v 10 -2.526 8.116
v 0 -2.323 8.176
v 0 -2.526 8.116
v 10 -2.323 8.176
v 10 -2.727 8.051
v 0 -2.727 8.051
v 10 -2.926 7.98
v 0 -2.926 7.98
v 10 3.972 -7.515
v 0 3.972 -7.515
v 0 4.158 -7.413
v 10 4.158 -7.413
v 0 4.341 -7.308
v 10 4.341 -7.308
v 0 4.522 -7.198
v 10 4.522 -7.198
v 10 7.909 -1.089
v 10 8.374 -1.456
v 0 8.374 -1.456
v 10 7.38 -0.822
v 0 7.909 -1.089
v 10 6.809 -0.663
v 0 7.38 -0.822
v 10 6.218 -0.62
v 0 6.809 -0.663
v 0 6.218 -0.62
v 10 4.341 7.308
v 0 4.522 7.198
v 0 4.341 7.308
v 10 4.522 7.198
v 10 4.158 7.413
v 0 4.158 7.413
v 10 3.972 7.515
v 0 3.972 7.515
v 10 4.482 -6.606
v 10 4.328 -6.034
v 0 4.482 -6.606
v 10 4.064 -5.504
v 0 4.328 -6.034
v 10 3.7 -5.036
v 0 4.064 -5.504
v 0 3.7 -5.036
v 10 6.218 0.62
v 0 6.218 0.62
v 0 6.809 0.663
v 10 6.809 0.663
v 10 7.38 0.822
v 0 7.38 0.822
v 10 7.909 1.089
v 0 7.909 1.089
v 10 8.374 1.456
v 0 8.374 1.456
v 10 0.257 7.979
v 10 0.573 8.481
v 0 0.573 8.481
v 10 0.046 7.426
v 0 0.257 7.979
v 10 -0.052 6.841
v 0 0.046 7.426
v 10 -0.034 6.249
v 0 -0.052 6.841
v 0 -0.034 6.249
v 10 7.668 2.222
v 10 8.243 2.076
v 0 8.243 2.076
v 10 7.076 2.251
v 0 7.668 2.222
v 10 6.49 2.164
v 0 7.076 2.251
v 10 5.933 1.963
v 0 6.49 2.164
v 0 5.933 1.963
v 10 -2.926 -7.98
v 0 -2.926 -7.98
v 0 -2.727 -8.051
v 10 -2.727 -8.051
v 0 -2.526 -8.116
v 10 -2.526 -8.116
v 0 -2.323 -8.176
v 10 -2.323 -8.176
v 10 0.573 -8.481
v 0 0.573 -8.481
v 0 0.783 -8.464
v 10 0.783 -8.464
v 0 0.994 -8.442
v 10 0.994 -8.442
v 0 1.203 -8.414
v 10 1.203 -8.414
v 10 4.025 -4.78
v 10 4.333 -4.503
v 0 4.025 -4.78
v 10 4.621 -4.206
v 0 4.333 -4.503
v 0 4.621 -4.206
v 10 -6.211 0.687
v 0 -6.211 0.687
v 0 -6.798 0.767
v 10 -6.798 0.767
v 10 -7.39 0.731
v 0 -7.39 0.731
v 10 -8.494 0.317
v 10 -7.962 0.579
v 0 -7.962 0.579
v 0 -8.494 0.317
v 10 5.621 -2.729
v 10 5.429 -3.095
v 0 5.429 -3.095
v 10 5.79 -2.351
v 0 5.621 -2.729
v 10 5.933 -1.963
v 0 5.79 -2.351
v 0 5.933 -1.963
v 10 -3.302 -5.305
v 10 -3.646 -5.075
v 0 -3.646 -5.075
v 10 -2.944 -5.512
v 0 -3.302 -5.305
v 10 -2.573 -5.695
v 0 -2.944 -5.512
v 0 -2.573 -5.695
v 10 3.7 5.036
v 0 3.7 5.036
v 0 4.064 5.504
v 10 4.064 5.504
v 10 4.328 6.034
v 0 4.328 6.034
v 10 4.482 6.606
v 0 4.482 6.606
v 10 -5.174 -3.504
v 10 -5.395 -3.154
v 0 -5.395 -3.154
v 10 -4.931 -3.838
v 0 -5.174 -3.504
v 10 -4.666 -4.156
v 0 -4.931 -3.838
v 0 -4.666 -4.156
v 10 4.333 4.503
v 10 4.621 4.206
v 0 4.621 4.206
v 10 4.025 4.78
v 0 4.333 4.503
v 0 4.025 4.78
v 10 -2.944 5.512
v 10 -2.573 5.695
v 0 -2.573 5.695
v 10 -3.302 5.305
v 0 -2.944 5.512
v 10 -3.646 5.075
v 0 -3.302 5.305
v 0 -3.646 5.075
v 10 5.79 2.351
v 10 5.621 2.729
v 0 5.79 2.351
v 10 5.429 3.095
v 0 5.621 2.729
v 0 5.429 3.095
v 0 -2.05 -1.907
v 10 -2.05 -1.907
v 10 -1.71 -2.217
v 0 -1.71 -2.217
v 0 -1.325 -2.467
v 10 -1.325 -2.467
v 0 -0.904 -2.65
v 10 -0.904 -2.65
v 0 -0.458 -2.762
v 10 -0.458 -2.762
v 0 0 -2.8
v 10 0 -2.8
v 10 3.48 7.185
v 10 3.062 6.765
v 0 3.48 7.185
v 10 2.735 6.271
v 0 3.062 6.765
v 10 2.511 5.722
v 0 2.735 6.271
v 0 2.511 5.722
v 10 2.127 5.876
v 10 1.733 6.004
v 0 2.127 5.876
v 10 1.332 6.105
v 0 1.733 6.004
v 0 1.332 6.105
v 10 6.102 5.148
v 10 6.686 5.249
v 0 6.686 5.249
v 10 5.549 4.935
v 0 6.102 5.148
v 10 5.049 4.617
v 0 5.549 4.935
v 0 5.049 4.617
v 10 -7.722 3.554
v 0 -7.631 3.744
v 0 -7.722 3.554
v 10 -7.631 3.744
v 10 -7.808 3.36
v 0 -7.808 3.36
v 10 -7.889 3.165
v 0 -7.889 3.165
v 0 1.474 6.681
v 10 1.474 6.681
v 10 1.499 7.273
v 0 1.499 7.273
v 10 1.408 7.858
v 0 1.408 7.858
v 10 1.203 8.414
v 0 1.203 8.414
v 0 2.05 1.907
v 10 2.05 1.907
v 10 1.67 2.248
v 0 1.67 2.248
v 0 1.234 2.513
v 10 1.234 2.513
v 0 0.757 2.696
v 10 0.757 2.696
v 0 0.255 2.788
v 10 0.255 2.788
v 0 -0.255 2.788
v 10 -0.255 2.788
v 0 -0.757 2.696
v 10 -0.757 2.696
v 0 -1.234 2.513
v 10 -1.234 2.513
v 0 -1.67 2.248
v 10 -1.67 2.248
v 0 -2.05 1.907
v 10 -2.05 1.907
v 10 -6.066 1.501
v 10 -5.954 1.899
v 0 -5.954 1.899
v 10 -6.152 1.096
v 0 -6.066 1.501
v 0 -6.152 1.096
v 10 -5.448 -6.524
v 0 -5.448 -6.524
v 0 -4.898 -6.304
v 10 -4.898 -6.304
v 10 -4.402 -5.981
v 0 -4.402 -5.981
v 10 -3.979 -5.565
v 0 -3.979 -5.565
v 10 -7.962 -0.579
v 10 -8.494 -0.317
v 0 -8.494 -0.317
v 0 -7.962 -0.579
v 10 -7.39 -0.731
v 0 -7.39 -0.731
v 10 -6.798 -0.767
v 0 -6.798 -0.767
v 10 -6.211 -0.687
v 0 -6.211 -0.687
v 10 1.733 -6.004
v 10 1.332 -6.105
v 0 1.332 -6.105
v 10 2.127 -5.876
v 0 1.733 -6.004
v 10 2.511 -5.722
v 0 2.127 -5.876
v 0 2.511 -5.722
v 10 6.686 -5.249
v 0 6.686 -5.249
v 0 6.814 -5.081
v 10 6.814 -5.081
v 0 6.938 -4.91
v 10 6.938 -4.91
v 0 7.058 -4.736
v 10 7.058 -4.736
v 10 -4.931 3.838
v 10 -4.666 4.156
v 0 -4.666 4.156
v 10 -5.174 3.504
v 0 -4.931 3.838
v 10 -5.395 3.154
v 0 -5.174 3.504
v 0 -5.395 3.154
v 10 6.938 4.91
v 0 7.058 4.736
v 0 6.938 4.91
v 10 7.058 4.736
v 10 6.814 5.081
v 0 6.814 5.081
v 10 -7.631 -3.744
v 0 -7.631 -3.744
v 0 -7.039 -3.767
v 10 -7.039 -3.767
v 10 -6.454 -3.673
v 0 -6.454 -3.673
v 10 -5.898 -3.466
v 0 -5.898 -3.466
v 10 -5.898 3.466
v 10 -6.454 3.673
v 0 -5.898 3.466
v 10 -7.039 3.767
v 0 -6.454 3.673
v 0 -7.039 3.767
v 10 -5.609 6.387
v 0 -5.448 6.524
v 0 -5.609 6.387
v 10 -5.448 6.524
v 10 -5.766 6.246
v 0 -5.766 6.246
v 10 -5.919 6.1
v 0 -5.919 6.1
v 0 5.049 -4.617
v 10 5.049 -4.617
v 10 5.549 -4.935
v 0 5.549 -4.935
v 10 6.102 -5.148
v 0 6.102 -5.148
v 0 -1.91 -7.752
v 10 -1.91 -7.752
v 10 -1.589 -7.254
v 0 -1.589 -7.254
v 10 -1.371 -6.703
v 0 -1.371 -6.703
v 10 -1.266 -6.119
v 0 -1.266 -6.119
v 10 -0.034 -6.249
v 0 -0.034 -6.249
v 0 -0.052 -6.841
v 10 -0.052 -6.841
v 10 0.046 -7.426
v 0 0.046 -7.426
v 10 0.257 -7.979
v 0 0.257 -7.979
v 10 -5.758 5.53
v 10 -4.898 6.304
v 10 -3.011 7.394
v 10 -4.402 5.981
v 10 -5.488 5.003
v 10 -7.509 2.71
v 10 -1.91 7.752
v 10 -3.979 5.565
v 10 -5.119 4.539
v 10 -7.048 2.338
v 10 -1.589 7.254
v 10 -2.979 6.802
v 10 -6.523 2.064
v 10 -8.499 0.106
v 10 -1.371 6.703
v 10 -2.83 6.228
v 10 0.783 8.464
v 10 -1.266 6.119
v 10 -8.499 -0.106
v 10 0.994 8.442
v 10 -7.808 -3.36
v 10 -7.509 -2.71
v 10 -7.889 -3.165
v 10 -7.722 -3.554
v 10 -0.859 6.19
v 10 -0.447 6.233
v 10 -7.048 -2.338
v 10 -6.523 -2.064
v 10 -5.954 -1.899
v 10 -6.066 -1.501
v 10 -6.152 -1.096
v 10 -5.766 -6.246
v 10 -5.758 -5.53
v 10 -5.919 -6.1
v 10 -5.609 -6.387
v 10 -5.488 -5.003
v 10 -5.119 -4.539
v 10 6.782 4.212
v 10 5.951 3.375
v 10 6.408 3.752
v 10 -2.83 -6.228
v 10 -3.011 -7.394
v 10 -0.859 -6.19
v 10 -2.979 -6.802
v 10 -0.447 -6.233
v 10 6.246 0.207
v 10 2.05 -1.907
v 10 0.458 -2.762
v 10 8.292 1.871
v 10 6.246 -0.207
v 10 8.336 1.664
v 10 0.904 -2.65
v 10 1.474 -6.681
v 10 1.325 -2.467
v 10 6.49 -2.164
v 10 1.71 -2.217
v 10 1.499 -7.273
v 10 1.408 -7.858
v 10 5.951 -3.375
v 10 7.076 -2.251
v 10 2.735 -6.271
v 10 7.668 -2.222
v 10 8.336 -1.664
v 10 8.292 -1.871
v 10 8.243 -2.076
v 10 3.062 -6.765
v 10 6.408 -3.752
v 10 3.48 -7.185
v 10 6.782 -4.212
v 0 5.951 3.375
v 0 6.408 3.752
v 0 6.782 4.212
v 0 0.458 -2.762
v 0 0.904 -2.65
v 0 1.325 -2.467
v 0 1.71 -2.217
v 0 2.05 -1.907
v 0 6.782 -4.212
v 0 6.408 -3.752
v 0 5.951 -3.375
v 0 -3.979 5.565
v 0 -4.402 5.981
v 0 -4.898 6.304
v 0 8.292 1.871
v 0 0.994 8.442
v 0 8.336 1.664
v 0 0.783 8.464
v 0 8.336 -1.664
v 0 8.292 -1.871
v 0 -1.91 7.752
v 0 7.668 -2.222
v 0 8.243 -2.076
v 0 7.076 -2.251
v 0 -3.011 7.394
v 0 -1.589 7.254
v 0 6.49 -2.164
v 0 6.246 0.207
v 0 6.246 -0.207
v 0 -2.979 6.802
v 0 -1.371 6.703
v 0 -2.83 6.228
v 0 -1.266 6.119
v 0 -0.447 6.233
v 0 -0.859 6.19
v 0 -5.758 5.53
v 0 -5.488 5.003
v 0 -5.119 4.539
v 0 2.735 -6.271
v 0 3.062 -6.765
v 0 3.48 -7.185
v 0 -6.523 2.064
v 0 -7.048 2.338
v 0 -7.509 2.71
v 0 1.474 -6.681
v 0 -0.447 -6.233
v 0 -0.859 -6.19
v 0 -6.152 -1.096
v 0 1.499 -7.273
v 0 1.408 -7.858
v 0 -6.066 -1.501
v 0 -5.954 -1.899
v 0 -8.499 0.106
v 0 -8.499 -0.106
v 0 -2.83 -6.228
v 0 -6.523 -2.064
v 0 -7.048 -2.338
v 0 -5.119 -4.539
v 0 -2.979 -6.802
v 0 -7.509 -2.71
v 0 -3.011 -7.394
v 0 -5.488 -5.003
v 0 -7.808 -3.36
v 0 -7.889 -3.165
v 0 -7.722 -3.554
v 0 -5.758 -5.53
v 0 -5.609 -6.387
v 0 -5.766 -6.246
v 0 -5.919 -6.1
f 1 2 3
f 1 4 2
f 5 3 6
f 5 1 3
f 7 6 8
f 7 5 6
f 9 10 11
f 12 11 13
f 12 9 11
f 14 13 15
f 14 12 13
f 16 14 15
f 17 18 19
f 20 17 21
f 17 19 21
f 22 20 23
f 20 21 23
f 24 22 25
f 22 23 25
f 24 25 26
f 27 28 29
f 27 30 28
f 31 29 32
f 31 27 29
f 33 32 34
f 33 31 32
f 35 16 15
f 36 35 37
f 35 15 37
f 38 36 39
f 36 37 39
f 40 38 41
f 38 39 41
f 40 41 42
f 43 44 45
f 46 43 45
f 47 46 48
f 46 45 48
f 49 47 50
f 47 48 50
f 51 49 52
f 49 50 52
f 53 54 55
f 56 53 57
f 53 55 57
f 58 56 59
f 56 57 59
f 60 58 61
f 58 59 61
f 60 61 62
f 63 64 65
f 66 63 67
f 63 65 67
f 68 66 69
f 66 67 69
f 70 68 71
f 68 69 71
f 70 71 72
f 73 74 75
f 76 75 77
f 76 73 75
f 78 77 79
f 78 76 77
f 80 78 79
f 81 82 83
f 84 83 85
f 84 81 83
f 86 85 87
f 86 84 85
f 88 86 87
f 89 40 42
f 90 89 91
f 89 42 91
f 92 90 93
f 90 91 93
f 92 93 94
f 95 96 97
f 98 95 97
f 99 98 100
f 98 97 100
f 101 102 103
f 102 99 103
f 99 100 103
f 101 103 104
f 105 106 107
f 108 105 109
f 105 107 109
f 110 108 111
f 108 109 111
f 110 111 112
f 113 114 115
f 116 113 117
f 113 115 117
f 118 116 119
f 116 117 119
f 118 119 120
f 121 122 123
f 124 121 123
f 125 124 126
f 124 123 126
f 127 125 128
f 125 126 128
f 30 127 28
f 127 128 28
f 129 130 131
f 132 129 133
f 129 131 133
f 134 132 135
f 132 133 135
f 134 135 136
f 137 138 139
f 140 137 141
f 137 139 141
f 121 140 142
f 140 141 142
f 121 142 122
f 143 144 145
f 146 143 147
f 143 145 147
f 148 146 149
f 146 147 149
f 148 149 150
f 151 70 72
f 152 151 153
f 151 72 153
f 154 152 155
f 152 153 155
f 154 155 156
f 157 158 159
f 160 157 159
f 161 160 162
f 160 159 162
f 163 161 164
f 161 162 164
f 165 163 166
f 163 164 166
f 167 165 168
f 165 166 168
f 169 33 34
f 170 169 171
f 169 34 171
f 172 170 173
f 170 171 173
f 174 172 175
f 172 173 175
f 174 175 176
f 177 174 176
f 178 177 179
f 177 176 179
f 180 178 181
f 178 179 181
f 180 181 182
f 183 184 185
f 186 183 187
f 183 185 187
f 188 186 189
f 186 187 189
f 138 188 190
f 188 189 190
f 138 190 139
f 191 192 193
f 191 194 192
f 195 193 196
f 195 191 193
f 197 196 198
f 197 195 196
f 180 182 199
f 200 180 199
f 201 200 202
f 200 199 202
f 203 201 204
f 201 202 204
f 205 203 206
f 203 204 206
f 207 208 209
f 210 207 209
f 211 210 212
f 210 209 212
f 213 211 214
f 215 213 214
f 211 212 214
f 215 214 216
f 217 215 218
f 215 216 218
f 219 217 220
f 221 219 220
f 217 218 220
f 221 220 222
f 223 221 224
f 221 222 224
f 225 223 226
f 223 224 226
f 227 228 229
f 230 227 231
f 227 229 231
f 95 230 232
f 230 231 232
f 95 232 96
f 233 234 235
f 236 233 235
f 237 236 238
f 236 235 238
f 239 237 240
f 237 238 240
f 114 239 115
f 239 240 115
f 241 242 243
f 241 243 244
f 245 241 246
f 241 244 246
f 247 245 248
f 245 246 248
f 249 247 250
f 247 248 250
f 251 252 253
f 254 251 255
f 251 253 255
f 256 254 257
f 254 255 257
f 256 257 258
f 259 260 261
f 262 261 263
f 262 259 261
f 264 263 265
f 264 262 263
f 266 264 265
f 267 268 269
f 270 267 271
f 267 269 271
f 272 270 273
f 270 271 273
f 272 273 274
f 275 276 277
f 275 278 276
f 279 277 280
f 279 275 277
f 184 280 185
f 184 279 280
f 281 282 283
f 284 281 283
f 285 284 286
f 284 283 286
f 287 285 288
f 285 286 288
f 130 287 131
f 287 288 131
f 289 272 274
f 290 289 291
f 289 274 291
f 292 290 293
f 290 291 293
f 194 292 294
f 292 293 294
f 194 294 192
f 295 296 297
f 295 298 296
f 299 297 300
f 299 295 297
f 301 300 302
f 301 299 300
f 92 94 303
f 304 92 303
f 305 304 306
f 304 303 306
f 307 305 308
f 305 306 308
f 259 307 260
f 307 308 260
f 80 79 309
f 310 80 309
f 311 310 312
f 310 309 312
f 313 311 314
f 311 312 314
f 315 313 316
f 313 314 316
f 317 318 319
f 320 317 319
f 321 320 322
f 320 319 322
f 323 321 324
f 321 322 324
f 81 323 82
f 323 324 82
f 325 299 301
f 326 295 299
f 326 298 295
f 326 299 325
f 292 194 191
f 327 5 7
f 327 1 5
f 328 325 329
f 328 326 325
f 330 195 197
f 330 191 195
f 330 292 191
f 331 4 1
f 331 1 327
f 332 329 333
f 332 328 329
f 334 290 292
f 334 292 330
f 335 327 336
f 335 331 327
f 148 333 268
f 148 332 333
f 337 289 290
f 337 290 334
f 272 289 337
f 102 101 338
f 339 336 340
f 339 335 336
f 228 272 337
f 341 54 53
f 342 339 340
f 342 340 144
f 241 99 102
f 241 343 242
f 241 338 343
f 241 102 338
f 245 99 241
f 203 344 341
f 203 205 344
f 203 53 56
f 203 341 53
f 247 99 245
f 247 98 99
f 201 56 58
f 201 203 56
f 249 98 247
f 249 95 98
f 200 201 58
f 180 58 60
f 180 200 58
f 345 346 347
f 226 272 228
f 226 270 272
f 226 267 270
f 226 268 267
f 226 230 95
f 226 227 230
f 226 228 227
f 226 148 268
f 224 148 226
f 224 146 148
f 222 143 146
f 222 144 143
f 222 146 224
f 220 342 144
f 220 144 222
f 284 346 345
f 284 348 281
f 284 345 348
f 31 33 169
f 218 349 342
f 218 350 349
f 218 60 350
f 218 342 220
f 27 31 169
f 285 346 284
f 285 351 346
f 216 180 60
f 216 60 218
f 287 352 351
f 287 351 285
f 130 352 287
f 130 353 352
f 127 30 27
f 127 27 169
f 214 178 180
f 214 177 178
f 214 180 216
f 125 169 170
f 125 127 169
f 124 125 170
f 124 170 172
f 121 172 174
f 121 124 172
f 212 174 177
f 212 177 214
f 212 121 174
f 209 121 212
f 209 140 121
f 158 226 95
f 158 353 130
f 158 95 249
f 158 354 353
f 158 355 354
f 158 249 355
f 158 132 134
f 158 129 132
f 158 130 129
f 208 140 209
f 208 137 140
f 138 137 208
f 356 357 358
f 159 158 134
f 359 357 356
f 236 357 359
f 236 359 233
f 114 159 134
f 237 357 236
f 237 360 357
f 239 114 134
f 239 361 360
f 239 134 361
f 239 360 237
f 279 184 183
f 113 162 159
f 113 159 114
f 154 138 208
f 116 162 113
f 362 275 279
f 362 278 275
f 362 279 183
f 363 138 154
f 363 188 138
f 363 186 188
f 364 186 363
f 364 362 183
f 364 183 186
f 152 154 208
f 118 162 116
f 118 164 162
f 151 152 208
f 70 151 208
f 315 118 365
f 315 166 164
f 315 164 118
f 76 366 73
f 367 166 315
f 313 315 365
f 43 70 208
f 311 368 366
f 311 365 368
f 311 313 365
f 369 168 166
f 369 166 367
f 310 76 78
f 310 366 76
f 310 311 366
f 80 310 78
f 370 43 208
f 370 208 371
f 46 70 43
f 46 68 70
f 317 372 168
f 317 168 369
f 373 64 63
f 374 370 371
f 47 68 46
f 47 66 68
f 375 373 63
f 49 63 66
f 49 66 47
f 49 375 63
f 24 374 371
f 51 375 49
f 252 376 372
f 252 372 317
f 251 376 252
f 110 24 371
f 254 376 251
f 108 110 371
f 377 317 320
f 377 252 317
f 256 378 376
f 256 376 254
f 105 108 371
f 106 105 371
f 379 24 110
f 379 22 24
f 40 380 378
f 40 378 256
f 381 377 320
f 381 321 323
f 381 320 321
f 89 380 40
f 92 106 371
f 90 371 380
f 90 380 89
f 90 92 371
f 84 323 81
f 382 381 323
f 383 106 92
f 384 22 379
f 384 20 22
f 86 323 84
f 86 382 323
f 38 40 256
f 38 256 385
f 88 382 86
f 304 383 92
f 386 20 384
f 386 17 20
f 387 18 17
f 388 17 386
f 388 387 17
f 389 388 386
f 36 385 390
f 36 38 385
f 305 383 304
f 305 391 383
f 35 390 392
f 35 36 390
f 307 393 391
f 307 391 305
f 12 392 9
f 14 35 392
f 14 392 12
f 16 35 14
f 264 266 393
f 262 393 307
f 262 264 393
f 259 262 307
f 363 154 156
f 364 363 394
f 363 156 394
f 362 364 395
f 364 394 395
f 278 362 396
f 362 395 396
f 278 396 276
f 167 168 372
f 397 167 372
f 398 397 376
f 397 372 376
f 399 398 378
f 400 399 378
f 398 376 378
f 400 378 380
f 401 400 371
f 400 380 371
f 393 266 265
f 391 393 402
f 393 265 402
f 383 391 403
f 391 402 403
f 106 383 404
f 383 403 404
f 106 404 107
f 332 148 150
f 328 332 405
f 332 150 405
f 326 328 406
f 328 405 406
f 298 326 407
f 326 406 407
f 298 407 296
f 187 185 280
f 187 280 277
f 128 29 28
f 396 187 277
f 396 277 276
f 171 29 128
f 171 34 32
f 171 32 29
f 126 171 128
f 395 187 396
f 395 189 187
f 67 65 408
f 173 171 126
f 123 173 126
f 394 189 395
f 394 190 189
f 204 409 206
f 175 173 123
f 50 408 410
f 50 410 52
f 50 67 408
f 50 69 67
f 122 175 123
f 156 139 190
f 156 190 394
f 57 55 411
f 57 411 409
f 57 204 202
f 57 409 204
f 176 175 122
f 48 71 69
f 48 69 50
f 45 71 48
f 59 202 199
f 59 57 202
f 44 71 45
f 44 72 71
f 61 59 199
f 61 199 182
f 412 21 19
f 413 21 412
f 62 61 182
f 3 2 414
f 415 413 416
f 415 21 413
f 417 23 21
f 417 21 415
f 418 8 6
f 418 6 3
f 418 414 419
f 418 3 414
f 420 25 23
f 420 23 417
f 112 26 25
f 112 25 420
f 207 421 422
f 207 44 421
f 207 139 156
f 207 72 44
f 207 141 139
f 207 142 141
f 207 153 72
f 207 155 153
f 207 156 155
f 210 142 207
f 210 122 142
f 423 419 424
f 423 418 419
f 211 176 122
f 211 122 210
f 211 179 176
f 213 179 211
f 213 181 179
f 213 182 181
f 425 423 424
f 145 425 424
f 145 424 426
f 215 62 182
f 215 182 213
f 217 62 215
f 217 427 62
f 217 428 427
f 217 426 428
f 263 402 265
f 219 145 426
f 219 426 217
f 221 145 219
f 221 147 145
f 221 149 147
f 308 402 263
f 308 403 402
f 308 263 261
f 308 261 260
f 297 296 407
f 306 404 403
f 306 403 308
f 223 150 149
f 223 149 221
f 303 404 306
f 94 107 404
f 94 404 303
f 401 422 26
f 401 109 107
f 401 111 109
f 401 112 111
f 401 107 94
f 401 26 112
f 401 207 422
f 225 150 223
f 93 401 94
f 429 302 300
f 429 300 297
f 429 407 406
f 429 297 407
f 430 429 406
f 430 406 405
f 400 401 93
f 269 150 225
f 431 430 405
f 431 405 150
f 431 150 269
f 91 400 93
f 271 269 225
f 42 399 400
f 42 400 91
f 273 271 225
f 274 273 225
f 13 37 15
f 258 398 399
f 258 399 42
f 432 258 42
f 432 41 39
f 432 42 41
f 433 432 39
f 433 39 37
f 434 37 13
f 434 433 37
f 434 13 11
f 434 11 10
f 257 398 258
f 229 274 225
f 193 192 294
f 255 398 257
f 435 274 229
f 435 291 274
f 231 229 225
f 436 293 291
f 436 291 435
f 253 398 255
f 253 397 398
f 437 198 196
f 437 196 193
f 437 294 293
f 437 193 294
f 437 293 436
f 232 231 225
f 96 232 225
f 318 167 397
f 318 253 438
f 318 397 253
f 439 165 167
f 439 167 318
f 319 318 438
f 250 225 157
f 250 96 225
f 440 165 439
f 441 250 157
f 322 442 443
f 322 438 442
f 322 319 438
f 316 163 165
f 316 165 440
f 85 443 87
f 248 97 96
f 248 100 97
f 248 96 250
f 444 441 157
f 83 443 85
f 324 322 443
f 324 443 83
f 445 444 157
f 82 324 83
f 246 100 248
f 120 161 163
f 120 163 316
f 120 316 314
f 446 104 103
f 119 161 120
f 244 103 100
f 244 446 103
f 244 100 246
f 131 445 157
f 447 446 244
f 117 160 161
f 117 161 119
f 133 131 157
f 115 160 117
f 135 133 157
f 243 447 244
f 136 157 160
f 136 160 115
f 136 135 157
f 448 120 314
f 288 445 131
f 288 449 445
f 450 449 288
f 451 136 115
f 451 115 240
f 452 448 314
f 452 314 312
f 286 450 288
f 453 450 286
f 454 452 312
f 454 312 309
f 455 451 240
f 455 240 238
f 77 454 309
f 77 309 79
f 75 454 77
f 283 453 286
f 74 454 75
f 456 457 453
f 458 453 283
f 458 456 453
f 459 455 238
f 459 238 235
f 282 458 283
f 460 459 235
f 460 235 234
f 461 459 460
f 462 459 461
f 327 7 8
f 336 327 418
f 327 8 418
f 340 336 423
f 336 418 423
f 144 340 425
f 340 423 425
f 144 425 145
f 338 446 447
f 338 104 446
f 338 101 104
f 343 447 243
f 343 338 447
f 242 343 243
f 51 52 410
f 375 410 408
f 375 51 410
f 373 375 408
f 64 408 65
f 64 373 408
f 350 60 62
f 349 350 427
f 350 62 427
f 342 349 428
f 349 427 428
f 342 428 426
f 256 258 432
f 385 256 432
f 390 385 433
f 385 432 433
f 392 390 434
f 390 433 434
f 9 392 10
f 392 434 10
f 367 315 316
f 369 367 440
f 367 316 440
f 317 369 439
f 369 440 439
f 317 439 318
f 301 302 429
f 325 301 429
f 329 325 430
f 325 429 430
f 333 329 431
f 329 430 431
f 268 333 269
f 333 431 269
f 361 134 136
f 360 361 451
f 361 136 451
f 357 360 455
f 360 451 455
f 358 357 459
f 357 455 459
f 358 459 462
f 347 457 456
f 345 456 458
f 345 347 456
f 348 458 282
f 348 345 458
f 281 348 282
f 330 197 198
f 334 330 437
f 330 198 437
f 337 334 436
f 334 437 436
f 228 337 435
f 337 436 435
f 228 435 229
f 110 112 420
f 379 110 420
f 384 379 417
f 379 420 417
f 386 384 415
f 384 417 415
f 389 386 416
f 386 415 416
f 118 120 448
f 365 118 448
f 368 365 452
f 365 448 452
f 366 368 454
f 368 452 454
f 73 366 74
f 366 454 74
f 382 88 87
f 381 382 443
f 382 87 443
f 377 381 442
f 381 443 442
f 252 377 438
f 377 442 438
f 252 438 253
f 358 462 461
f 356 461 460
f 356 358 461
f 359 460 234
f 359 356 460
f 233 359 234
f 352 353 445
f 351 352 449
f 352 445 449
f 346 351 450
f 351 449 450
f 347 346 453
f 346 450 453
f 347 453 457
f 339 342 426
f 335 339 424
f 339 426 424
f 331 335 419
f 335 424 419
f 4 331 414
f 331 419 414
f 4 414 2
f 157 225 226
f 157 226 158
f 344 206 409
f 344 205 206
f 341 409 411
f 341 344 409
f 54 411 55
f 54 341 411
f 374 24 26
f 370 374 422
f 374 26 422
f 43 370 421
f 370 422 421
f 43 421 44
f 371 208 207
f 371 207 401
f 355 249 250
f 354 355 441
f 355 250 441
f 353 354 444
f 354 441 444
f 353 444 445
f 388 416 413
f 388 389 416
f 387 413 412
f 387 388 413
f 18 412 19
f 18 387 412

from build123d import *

# Parameters (mm, degrees)
BASPROSKE_W         = 10
BASPROSKE_H         = 8.5
TOOTHCUT_DEPTH      = 16.636495771
TEETHCUTS_COUNT     = 15
TEETHCUTS_ANGLE     = 336
BORSKE_R            = 2.5
BORE_DEPTH          = 50.0000508
BOSS_EXTRUDE1_DEPTH = 10
CUT_EXTRUDE1_DEPTH  = 10


with BuildPart() as part:
    # BasProSke → Base-Revolve (revolve)
    with BuildSketch(Plane(origin=(0, 0, 0), x_dir=(1, 0, 0), z_dir=(0, 1, 0)), mode=Mode.PRIVATE) as base_revolve_sk:
        with Locations((5, 4.25)):
            Rectangle(BASPROSKE_W, BASPROSKE_H)
    revolve(base_revolve_sk.sketch.rotate(Axis((-10, 0, 0), (1, 0, 0)), 180), axis=Axis((-10, 0, 0), (1, 0, 0)))

    # TooCutSke → ToothCut (cut, through all)
    with BuildSketch(Plane(origin=(0, 0, 0), x_dir=(0, 0, -1), z_dir=(1, 0, 0))):
        with BuildLine():
            ThreePointArc((0.619547138, 6.21821215), (0, 6.249), (-0.619547138, 6.21821215))
            ThreePointArc((-0.619547138, 6.21821215), (-0.827197364, 7.394441061), (-1.477319646, 8.396426134))
            ThreePointArc((-1.477319646, 8.396426134), (0, 8.5254), (1.477319646, 8.396426134))
            ThreePointArc((1.477319646, 8.396426134), (0.827197364, 7.394441061), (0.619547138, 6.21821215))
        make_face()
    toothcut = extrude(amount=TOOTHCUT_DEPTH, mode=Mode.SUBTRACT)

    # TeethCuts: ToothCut ×15 about axis
    teethcuts_axis = Axis((-10, 0, 0), (1, 0, 0))
    for i in range(1, TEETHCUTS_COUNT):
        add(toothcut.rotate(teethcuts_axis, i * TEETHCUTS_ANGLE / (TEETHCUTS_COUNT - 1)), mode=Mode.SUBTRACT)

    # BorSke → Bore (cut, symmetric)
    with BuildSketch(Plane(origin=(0, 0, 0), x_dir=(0, 0, -1), z_dir=(1, 0, 0))):
        with Locations(Location((0, 0, 0), (0, 0, 180))):
            Circle(BORSKE_R)
    extrude(amount=BORE_DEPTH, both=True, mode=Mode.SUBTRACT)

    # Sketch1 → Boss-Extrude1 (add, through all)
    with BuildSketch(Plane(origin=(10, 0, 0), x_dir=(0, 0, -1), z_dir=(1, 0, 0))):
        with BuildLine():
            ThreePointArc((1.907223112, 2.05), (0, 2.8), (-1.907223112, 2.05))
            Line((-1.907223112, 2.05), (1.907223112, 2.05))
        make_face()
        with BuildLine():
            Line((1.907223112, -2.05), (-1.907223112, -2.05))
            ThreePointArc((-1.907223112, -2.05), (0, -2.8), (1.907223112, -2.05))
        make_face()
    extrude(amount=-BOSS_EXTRUDE1_DEPTH)

    # Sketch1<3> → Cut-Extrude1 (cut)
    with BuildSketch(Plane(origin=(10, 0, 0), x_dir=(0, 0, -1), z_dir=(1, 0, 0))):
        with BuildLine():
            Line((1.907223112, 2.05), (-1.907223112, 2.05))
            ThreePointArc((-1.907223112, 2.05), (-2.8, 0), (-1.907223112, -2.05))
            Line((-1.907223112, -2.05), (1.907223112, -2.05))
            ThreePointArc((1.907223112, -2.05), (2.567121415, -1.11798374), (2.8, 0))
            ThreePointArc((2.8, 0), (2.567121415, 1.11798374), (1.907223112, 2.05))
        make_face()
    extrude(amount=-CUT_EXTRUDE1_DEPTH, mode=Mode.SUBTRACT)


solid = part.part
